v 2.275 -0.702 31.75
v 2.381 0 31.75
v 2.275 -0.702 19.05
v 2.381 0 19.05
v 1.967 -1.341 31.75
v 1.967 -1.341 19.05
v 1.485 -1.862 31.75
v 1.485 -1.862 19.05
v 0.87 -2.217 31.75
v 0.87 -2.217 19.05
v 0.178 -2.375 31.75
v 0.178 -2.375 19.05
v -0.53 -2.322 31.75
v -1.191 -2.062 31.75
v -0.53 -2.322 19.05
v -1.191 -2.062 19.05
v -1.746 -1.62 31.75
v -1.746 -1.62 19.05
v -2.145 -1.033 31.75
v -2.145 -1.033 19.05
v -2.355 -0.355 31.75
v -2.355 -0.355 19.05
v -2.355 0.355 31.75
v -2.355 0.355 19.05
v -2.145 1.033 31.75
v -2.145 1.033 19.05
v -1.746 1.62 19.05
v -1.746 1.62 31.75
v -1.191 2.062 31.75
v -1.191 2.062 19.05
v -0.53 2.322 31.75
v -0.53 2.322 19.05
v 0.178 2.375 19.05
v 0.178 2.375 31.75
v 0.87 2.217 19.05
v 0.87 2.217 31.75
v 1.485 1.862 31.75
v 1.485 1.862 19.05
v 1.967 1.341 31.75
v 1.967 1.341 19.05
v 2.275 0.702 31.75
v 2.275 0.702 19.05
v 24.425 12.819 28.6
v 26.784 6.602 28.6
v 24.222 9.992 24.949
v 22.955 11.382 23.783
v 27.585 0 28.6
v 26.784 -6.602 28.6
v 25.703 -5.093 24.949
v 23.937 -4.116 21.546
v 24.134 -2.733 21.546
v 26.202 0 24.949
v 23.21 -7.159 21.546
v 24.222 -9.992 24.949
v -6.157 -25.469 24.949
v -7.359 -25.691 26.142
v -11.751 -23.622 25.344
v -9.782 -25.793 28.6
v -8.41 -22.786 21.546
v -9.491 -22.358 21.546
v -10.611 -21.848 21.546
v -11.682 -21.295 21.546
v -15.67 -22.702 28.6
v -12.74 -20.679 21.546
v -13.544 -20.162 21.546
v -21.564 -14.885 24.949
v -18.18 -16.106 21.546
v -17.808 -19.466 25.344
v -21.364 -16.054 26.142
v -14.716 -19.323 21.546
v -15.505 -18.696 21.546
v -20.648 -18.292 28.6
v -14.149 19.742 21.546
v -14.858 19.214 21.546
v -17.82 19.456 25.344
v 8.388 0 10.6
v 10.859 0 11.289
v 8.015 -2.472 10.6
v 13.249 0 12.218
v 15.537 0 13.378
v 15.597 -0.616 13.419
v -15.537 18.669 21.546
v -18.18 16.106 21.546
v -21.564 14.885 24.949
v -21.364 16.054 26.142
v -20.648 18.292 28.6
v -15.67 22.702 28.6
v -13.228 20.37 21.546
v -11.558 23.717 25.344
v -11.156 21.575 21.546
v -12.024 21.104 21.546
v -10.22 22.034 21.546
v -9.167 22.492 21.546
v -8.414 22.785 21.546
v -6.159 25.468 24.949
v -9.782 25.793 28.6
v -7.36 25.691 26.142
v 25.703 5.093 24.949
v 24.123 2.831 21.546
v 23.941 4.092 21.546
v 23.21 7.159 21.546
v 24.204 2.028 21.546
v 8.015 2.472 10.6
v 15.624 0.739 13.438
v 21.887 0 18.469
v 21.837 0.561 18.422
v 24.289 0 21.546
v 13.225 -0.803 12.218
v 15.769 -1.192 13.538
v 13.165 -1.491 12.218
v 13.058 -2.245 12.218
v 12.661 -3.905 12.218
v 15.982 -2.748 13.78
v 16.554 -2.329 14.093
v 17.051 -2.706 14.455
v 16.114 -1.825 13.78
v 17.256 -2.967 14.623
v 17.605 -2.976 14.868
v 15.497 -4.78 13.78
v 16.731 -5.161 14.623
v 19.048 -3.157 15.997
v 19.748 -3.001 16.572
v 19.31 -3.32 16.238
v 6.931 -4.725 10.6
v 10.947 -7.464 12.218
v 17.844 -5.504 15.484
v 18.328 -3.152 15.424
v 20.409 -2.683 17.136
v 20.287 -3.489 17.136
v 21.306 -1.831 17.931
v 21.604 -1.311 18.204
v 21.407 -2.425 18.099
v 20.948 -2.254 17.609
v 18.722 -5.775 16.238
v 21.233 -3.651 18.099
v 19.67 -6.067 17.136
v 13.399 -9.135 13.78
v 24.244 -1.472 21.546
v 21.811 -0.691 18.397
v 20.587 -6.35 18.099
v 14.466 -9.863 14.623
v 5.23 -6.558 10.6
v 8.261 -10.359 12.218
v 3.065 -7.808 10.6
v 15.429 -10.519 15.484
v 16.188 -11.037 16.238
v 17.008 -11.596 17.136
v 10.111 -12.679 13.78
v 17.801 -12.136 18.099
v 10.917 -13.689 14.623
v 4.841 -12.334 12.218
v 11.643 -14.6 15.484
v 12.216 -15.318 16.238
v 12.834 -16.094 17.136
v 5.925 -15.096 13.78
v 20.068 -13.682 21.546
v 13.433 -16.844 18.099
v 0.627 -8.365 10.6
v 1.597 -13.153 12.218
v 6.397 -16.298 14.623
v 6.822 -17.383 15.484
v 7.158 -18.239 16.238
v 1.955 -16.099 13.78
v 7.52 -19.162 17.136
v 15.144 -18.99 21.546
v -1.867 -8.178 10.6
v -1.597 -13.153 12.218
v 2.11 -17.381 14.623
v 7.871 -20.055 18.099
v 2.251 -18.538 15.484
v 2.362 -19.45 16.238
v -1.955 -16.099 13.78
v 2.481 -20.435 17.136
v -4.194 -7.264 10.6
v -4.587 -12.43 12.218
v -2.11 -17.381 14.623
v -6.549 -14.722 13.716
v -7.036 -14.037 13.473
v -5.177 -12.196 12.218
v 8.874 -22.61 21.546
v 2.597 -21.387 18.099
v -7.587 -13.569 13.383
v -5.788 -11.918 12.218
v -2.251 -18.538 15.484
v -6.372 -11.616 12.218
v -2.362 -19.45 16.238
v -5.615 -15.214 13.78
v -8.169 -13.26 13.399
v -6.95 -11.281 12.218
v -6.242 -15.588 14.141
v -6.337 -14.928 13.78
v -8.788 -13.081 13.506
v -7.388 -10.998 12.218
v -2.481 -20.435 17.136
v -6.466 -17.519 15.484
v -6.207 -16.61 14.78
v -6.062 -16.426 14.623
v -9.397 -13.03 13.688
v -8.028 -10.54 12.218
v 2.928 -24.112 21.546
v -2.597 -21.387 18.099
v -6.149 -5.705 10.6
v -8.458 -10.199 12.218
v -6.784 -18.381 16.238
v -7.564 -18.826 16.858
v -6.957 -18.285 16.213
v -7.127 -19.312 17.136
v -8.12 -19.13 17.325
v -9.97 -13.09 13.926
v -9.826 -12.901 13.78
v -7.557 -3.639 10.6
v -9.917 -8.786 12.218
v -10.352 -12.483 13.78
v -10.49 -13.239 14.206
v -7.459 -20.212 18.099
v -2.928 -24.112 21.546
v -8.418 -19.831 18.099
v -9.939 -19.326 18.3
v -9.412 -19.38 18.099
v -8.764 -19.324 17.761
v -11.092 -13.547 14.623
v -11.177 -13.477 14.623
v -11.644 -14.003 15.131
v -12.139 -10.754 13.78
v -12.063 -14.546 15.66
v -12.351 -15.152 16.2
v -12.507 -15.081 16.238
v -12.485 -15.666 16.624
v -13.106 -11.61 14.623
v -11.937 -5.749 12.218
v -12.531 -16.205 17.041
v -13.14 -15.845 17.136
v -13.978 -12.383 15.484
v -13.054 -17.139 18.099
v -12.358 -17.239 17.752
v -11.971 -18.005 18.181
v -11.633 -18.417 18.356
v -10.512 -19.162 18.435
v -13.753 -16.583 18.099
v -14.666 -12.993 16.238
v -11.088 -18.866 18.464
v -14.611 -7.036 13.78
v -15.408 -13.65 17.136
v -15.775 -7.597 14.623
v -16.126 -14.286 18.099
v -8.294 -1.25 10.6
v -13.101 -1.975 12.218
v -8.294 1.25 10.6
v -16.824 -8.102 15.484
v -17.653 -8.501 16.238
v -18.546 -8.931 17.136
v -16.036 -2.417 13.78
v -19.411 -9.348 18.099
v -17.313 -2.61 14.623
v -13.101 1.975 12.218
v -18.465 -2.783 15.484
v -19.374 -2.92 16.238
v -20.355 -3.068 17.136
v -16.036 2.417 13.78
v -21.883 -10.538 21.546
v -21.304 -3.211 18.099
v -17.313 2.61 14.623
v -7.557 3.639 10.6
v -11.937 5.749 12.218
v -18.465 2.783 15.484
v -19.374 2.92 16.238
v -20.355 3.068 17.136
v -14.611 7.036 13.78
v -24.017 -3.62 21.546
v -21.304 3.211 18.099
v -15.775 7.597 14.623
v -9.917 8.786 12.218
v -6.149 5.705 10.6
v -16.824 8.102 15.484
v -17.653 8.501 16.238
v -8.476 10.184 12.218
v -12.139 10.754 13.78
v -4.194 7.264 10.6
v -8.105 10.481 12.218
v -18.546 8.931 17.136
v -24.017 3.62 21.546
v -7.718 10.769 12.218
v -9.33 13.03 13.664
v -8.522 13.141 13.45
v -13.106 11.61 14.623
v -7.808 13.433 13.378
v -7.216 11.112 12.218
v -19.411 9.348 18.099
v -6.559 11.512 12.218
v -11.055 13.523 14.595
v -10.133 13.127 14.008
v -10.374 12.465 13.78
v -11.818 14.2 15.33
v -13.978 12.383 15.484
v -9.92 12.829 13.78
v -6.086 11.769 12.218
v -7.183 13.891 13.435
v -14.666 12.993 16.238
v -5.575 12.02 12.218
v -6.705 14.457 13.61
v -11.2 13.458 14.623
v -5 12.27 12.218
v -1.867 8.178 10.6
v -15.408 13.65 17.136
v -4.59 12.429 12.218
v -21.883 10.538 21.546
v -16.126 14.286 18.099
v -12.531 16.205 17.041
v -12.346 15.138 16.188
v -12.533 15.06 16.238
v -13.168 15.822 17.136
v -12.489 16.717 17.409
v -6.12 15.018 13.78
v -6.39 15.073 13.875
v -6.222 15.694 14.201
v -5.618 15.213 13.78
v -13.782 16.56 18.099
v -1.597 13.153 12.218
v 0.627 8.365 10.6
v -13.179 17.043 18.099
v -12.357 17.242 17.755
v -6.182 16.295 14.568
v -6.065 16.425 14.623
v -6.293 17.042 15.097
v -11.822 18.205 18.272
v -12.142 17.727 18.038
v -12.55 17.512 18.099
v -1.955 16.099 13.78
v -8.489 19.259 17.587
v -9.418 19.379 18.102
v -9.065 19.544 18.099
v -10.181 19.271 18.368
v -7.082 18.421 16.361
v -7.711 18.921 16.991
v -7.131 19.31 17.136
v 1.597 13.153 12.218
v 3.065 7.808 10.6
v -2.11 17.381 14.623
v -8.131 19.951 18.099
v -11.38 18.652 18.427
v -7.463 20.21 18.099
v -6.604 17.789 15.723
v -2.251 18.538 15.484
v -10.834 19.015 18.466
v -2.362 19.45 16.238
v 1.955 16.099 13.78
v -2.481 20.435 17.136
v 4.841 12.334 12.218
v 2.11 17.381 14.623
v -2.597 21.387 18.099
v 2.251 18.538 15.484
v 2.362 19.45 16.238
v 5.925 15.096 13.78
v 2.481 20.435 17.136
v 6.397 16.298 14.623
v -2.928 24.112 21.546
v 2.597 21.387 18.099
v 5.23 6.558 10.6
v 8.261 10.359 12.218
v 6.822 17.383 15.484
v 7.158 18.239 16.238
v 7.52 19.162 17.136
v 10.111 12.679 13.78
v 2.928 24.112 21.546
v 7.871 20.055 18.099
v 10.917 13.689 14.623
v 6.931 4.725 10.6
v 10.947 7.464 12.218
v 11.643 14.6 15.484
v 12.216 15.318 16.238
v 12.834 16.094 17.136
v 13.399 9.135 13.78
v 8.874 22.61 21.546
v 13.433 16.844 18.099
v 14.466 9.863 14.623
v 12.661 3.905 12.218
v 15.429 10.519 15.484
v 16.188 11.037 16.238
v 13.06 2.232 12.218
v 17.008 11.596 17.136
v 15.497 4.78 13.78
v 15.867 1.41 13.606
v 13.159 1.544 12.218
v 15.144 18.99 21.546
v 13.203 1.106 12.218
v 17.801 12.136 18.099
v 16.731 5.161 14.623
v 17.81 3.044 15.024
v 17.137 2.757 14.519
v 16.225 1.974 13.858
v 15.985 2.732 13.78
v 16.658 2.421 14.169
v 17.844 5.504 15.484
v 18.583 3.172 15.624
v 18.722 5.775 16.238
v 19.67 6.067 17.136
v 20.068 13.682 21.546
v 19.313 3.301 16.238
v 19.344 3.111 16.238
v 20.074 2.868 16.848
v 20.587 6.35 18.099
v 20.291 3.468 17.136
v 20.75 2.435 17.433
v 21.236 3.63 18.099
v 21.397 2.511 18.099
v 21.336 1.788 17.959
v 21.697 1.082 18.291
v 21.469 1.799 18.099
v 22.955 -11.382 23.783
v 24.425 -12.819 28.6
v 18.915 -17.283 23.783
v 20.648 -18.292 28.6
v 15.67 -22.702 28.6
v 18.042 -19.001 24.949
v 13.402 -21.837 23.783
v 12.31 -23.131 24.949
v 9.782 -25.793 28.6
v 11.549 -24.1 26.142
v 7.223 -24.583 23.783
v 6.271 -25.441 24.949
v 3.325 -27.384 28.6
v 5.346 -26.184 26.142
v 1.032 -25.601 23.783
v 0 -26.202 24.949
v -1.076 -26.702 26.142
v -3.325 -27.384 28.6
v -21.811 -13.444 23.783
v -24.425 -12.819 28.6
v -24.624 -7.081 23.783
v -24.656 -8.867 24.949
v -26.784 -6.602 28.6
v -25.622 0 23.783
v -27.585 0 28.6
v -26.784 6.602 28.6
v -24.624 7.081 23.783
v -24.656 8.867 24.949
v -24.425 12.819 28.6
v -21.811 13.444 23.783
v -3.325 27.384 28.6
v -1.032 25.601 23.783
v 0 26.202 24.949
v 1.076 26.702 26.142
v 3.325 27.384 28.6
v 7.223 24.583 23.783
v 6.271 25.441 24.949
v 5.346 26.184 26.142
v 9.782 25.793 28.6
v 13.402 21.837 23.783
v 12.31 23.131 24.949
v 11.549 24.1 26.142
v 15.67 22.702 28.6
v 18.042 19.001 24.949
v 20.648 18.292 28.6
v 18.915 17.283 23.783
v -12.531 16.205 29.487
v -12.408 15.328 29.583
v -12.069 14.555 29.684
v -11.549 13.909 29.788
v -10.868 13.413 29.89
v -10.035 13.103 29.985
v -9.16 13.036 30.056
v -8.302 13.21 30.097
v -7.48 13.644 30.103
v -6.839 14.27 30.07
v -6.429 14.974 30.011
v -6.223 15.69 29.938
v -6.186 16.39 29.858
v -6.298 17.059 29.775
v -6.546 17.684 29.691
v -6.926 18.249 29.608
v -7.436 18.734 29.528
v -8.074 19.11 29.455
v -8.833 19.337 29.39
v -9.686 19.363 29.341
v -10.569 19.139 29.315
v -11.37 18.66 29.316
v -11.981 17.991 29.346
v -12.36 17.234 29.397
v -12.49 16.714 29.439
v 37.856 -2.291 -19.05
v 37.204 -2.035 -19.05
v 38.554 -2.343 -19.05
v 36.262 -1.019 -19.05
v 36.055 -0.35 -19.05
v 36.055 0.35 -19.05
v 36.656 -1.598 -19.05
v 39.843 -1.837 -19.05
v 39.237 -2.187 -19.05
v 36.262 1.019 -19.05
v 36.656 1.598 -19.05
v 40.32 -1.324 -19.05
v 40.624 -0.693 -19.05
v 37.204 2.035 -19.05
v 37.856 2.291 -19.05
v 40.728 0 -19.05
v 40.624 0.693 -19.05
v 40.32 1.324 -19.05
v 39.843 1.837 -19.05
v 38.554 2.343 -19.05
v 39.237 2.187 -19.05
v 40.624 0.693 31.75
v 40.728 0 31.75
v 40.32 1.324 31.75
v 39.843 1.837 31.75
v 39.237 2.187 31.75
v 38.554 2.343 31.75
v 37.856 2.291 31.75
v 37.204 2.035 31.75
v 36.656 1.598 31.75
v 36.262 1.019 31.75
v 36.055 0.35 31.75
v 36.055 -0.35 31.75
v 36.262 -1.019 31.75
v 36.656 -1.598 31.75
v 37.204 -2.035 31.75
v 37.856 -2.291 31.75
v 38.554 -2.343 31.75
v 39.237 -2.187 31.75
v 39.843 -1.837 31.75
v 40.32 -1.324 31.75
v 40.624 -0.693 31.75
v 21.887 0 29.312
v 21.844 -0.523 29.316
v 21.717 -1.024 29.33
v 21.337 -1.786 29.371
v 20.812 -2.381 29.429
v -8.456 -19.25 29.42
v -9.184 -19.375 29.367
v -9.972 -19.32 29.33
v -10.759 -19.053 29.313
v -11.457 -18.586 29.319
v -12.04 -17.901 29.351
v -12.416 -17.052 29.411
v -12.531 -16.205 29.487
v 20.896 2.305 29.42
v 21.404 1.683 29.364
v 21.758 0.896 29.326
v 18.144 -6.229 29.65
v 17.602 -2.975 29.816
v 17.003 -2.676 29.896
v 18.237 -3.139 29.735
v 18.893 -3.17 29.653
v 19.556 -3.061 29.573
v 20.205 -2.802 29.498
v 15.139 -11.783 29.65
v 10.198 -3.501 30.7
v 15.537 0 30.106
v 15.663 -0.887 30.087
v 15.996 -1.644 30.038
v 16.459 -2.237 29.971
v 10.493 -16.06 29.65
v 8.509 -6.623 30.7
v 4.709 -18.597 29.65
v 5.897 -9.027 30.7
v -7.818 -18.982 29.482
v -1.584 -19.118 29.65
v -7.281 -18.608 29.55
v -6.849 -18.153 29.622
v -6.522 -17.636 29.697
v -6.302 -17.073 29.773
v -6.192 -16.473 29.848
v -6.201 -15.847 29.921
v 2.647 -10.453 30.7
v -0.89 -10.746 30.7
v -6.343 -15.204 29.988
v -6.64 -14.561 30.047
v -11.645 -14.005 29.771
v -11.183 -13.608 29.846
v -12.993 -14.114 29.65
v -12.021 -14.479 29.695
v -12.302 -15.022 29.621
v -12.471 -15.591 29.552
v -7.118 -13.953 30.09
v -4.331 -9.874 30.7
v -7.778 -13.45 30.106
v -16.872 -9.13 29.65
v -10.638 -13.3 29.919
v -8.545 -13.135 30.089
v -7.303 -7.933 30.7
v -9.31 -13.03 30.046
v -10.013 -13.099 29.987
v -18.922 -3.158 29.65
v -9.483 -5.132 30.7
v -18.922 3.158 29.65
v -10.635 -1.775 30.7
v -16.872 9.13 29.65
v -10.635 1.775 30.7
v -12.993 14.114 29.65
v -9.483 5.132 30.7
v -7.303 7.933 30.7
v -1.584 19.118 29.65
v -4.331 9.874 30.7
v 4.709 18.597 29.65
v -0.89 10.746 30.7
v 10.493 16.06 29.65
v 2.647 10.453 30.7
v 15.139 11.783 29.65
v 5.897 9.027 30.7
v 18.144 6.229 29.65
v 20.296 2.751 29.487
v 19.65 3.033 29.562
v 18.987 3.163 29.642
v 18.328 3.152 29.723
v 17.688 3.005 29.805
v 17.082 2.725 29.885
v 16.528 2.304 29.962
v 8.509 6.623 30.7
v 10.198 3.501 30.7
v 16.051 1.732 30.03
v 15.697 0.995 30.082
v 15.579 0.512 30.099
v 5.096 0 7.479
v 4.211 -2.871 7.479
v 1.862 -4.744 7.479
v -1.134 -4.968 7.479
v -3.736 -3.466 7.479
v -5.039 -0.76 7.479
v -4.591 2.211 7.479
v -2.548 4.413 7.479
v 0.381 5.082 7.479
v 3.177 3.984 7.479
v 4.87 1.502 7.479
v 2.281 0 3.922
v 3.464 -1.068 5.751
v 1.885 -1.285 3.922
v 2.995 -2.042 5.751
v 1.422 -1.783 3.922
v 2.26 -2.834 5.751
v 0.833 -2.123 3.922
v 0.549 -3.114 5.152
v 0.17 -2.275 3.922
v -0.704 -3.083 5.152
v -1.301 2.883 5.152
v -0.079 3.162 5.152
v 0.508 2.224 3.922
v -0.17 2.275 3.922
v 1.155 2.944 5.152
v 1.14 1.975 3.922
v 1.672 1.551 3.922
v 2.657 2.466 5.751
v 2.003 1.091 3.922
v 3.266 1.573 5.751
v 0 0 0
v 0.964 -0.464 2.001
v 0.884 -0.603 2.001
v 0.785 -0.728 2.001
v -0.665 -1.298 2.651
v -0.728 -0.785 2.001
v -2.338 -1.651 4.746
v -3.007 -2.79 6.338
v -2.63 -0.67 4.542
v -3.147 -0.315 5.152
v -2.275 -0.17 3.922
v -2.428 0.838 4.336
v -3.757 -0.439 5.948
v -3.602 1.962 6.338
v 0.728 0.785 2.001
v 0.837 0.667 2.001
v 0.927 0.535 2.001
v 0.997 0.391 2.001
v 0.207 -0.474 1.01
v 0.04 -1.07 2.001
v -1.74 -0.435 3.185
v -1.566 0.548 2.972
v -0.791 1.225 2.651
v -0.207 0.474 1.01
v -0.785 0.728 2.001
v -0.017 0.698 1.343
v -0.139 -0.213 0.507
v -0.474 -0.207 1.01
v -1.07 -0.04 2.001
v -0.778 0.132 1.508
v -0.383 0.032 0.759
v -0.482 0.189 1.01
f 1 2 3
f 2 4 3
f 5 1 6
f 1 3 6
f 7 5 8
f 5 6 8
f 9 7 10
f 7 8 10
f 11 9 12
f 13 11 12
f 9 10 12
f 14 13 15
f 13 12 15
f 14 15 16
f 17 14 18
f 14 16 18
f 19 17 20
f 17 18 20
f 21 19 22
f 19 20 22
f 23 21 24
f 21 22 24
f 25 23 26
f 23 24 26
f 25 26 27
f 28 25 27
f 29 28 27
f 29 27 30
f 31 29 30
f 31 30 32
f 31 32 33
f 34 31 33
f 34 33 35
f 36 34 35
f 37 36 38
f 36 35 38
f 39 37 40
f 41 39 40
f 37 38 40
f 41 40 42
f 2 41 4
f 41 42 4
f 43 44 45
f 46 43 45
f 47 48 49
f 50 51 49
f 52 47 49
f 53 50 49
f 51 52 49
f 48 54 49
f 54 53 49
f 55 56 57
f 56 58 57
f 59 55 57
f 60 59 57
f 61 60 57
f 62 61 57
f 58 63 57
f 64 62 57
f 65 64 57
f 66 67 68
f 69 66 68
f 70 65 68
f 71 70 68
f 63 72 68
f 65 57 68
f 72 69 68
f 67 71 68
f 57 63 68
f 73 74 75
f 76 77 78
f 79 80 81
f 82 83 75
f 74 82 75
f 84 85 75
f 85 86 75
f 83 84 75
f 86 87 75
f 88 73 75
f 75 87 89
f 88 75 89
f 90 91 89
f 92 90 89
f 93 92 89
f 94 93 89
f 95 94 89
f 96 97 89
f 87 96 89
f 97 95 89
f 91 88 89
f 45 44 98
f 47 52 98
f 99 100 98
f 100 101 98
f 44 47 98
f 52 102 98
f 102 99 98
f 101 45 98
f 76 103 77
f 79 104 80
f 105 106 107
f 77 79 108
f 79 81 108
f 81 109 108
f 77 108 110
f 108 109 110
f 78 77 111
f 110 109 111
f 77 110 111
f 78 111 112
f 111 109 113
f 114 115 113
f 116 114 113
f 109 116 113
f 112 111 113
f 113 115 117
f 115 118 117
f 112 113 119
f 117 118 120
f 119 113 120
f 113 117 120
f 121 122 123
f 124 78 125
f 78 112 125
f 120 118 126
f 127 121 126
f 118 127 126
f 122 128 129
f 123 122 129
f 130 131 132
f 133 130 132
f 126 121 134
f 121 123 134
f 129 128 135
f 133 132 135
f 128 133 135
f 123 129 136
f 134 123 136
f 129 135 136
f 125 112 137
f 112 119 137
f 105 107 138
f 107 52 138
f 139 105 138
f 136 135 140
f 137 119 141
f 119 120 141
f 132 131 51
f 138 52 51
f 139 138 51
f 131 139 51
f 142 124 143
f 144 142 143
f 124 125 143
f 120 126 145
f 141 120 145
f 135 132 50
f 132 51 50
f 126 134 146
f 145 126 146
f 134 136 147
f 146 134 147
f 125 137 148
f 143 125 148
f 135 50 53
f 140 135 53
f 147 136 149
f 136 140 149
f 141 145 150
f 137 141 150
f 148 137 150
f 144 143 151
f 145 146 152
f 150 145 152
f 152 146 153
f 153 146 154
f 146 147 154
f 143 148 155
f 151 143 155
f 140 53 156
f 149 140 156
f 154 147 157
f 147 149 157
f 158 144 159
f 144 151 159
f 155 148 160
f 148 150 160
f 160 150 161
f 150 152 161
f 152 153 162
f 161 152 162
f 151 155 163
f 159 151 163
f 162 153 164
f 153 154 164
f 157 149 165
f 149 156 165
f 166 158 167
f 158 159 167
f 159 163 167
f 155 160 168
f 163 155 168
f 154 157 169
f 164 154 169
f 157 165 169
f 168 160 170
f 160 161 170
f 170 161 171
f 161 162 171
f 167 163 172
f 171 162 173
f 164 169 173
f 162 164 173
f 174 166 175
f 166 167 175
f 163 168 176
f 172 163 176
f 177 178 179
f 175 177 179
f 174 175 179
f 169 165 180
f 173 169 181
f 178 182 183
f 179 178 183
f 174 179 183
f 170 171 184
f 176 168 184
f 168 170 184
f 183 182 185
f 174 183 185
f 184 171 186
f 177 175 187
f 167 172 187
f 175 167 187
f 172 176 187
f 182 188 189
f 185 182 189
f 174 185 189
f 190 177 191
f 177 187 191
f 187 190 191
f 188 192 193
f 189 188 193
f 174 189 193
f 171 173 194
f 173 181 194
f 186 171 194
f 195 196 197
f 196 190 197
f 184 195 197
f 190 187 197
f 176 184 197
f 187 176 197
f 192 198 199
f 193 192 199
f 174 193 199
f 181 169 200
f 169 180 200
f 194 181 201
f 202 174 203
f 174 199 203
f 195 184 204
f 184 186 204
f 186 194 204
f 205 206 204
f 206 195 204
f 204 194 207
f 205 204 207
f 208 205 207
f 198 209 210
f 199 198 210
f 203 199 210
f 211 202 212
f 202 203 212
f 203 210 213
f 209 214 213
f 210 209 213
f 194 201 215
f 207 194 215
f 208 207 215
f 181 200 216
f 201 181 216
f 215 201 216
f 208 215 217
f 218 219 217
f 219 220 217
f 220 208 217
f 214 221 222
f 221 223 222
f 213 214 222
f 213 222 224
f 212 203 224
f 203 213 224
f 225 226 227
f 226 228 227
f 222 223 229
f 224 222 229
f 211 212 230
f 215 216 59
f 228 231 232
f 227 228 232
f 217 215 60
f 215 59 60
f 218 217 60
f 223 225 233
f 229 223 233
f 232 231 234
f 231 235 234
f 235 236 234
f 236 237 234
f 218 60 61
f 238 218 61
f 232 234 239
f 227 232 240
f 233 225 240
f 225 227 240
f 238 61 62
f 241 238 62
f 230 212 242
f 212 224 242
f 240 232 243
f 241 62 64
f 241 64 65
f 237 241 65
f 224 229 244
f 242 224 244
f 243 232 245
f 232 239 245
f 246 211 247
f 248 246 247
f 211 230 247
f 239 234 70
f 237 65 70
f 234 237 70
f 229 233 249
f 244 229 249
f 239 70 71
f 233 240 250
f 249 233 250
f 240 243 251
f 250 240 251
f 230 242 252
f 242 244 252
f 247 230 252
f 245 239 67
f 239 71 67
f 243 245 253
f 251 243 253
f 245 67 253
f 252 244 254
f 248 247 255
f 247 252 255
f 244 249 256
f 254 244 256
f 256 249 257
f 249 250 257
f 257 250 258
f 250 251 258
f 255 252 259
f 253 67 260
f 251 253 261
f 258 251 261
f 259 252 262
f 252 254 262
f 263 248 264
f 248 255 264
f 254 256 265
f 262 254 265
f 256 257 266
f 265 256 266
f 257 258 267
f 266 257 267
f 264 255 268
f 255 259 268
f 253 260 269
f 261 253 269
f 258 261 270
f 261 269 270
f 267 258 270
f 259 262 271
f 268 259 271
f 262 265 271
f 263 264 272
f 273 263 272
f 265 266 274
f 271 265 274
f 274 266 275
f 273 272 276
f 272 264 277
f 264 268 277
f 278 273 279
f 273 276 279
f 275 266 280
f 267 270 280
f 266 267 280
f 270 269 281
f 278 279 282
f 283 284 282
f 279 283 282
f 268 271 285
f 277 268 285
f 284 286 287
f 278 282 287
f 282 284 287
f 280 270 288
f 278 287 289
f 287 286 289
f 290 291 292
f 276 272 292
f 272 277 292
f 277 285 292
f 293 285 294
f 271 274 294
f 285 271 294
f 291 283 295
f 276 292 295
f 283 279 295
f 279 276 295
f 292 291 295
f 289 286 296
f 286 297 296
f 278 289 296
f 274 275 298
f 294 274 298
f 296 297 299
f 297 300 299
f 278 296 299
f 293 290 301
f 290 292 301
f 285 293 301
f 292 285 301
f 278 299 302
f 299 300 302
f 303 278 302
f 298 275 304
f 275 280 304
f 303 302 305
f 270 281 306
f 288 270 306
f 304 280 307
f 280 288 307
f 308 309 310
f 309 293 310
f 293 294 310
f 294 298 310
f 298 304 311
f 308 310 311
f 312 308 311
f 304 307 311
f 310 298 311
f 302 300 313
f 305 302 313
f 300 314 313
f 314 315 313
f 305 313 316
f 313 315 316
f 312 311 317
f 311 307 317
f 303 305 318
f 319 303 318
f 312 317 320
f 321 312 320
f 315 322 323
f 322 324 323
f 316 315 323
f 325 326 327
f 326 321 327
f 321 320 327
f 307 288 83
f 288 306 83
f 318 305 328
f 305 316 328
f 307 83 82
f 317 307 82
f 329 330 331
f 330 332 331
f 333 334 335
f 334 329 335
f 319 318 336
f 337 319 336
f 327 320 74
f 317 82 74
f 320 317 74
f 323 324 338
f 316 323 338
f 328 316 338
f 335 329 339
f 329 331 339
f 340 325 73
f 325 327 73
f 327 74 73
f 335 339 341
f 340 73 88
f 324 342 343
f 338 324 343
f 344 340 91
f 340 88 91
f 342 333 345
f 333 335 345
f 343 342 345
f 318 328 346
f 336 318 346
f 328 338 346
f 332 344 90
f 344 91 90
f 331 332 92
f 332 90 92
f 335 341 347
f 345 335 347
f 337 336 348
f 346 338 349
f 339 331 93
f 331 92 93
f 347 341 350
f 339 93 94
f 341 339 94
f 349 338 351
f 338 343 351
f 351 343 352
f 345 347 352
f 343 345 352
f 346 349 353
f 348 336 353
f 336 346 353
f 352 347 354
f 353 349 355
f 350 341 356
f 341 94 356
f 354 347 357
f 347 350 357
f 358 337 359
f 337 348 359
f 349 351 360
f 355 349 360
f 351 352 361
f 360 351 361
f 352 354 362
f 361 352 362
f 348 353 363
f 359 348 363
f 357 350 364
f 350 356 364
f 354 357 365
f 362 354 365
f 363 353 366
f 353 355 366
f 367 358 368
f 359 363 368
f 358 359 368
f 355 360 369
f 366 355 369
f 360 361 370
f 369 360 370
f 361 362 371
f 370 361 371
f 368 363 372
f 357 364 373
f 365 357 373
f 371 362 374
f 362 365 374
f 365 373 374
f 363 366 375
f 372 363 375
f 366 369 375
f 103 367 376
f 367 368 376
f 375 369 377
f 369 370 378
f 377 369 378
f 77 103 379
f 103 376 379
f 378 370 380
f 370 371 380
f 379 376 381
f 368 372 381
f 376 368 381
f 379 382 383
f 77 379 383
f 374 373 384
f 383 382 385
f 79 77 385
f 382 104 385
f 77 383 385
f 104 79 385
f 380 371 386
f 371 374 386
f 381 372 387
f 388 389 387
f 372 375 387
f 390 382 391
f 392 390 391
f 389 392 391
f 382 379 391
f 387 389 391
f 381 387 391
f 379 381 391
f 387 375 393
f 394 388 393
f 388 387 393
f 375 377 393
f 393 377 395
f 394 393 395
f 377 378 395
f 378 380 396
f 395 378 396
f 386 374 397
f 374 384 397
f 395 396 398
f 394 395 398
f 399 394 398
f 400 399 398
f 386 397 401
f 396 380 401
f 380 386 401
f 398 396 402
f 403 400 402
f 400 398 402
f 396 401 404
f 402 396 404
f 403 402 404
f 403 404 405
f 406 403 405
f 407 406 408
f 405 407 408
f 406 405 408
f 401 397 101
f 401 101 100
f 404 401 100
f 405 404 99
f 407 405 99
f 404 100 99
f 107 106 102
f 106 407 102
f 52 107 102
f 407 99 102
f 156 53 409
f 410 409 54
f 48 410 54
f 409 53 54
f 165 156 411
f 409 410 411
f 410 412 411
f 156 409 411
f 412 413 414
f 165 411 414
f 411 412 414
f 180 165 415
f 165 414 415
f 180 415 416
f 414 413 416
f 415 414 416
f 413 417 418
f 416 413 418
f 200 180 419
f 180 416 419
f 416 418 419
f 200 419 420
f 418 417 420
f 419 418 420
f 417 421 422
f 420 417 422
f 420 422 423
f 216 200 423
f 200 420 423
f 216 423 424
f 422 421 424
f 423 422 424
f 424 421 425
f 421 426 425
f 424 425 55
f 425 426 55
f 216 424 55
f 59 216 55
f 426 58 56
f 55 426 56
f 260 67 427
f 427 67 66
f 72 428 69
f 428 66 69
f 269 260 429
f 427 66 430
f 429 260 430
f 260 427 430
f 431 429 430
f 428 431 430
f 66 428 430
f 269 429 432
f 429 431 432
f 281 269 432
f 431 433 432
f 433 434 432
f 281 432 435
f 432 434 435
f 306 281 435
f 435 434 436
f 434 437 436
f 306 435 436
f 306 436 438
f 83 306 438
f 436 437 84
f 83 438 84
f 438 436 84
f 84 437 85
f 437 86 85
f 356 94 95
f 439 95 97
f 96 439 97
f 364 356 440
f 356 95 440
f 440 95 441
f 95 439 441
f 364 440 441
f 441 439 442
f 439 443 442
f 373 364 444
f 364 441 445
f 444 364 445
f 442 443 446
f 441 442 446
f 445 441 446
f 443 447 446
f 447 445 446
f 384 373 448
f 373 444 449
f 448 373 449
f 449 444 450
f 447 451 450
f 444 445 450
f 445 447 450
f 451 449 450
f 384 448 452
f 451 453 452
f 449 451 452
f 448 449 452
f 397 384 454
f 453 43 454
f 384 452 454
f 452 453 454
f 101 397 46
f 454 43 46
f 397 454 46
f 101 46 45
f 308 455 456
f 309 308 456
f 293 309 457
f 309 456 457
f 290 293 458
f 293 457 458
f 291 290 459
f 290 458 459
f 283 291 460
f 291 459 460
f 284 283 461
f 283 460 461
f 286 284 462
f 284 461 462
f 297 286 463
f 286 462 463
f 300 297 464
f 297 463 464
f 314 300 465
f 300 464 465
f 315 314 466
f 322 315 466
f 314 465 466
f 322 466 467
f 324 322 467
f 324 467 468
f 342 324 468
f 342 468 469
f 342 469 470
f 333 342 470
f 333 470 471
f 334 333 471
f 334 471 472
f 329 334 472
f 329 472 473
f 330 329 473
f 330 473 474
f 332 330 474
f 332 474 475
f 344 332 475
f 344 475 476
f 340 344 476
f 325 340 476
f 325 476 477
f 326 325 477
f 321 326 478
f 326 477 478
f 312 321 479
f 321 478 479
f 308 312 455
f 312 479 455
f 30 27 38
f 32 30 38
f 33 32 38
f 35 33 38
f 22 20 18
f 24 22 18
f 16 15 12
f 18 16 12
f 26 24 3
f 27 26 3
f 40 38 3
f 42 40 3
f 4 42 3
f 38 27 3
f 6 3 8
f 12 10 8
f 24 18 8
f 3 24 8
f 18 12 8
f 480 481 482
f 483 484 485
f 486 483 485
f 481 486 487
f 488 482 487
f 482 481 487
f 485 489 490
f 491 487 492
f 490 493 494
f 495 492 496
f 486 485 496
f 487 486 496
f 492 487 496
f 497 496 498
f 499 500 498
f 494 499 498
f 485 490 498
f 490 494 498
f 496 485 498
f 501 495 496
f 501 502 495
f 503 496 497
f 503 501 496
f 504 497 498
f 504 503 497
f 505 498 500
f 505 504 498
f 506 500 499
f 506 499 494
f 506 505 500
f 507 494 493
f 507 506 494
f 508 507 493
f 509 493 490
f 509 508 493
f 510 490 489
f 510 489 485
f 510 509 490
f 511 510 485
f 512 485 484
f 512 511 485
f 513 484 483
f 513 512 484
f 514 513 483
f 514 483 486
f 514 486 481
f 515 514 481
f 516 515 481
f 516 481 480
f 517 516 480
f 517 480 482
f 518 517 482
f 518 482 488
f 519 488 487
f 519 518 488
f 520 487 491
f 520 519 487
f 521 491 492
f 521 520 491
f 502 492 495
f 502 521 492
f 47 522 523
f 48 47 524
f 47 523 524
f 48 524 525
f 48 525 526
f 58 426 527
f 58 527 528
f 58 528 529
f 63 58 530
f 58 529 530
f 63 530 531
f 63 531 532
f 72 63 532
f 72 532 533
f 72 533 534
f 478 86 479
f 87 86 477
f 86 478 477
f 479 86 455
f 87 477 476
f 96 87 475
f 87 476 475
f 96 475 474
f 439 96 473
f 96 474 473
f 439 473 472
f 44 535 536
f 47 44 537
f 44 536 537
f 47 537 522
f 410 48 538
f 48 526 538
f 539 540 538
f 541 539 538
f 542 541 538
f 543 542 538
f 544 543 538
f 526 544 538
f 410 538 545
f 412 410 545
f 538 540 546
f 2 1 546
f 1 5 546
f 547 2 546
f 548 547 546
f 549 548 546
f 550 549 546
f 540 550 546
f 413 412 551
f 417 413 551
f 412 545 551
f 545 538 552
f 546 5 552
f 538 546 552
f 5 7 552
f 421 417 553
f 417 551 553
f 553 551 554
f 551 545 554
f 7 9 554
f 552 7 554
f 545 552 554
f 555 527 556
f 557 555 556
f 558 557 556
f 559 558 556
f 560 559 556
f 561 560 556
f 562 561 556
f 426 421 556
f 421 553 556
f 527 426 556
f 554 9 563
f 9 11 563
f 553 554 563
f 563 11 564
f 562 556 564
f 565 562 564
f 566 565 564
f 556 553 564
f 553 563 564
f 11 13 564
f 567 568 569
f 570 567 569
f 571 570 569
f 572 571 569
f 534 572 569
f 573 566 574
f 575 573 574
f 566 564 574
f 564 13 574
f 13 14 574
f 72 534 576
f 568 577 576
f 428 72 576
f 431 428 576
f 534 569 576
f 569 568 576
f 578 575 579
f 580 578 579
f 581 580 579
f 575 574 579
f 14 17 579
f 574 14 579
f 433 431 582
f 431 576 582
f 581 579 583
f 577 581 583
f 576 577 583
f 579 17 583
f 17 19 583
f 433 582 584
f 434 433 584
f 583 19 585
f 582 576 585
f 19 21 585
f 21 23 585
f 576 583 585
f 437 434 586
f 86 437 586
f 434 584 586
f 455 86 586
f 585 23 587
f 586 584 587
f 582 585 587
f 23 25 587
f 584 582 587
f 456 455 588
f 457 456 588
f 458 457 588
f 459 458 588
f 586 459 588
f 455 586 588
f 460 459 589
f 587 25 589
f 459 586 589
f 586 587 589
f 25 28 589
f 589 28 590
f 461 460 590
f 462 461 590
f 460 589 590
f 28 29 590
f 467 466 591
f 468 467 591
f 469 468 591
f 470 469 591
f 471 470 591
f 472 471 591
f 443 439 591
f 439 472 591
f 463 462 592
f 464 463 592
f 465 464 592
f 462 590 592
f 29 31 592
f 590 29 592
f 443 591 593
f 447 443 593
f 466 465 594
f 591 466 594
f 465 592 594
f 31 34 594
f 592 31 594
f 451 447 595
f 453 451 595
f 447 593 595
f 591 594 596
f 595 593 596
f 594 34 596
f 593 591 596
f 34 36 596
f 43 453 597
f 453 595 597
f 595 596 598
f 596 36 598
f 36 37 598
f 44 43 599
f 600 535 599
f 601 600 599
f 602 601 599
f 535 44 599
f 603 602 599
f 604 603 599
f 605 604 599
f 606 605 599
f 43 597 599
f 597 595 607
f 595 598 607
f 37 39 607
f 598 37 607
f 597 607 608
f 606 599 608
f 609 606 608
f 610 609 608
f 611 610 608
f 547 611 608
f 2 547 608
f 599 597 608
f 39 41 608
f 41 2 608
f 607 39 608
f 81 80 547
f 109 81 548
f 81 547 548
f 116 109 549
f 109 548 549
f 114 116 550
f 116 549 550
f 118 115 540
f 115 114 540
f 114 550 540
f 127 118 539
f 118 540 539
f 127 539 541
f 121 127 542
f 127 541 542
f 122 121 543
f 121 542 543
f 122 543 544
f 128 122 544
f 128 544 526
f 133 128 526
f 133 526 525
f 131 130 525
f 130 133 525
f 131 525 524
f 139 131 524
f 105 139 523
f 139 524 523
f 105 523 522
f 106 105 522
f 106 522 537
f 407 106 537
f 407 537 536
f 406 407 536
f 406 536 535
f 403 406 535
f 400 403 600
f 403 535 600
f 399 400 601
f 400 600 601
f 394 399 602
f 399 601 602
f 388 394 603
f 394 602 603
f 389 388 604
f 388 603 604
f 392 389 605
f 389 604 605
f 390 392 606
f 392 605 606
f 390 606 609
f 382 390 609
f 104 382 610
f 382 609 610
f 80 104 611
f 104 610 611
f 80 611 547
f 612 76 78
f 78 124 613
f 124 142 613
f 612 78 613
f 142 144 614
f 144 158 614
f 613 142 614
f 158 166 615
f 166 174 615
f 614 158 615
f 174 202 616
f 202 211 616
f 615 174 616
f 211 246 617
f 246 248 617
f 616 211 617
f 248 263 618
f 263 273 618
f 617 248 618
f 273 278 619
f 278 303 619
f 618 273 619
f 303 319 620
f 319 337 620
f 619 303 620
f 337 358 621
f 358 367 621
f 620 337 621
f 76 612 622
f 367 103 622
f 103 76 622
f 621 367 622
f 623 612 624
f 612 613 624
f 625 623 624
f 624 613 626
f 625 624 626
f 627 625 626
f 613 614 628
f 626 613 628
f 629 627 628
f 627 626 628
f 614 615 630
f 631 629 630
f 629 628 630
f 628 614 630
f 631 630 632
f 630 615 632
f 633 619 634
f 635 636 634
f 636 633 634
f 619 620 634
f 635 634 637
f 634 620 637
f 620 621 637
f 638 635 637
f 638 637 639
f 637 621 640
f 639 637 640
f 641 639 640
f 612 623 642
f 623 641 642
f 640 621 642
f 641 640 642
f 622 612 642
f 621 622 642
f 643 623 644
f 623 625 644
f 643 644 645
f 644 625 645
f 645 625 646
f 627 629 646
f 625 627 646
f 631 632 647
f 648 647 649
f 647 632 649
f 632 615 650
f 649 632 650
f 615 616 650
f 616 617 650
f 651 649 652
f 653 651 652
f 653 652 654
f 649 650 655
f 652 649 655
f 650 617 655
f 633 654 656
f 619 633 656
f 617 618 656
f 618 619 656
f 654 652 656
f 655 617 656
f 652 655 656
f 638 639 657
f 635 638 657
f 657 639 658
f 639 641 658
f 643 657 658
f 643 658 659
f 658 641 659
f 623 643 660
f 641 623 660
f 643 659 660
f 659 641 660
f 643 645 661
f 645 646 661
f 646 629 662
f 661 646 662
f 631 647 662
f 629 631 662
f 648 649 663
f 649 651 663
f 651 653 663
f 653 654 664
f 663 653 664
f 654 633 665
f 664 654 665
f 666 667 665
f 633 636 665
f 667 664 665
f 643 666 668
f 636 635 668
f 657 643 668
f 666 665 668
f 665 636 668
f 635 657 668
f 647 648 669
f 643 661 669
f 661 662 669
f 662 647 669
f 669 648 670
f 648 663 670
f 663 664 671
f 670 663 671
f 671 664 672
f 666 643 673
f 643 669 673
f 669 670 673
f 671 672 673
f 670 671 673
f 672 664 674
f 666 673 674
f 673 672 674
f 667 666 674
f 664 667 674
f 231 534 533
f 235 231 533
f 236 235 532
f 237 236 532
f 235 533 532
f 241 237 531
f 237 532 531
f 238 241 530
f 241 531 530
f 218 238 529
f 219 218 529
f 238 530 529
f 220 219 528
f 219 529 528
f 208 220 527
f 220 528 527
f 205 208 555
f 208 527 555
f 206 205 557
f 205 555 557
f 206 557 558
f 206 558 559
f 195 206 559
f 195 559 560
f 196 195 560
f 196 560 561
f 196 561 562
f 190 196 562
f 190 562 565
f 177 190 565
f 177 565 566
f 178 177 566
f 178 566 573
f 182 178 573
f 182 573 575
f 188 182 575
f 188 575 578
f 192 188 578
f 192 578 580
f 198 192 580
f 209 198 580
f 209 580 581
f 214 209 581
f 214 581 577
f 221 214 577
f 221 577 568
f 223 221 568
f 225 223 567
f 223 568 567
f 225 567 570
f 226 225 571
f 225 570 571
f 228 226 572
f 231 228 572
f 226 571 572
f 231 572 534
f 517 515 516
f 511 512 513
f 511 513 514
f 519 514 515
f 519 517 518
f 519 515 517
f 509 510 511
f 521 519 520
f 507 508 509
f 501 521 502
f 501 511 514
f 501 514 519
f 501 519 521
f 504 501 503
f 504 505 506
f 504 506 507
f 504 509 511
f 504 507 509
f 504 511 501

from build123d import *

# Parameters (mm, degrees)
F3_D          = 6.35
F4_R          = 2.3495
F5_DEPTH      = 31.75
F5_DEPTH_BACK = 19.05


# Not quite as in the source:
# - a feature names something its author has since deleted; it is built from what else it names


with BuildPart() as f1:
    # F0 (on Front) → F1 (revolve)
    with BuildSketch(Plane.XZ):
        with BuildLine():
            Line((0, 19.05), (0, 0))
            ThreePointArc((0, 0), (3.6250012472, 5.7505099882), (8.3881448954, 10.6004029512))
            ThreePointArc((8.3881448954, 10.6004029512), (20.4323715587, 16.9914499437), (27.5851080685, 28.5995177414))
            Line((27.5851080685, 28.5995177414), (2.38125, 31.75))
            Line((2.38125, 31.75), (2.38125, 19.05))
            Line((2.38125, 19.05), (0, 19.05))
        make_face()
    revolve(axis=Axis((0, 0, 9.525), (0, 0, -1)))

    # F3 (through all)
    with Locations(Plane(origin=(0, 0, 0), x_dir=(1, 0, 0), z_dir=(0, 0, -1))):
        with Locations((18.7120120972, 0), (-9.3560060486, -16.2050778321), (-9.3560060486, 16.2050778321)):
            Hole(F3_D / 2)


with BuildPart() as f5:
    # F4 (on Top) → F5 (new body, two sides)
    with BuildSketch(Plane.XY) as f5_sk:
        with Locations((38.3784368877, 0)):
            Circle(F4_R)
    extrude(amount=F5_DEPTH)
    extrude(f5_sk.sketch, amount=-F5_DEPTH_BACK)


solid = Compound([f1.part, f5.part])
